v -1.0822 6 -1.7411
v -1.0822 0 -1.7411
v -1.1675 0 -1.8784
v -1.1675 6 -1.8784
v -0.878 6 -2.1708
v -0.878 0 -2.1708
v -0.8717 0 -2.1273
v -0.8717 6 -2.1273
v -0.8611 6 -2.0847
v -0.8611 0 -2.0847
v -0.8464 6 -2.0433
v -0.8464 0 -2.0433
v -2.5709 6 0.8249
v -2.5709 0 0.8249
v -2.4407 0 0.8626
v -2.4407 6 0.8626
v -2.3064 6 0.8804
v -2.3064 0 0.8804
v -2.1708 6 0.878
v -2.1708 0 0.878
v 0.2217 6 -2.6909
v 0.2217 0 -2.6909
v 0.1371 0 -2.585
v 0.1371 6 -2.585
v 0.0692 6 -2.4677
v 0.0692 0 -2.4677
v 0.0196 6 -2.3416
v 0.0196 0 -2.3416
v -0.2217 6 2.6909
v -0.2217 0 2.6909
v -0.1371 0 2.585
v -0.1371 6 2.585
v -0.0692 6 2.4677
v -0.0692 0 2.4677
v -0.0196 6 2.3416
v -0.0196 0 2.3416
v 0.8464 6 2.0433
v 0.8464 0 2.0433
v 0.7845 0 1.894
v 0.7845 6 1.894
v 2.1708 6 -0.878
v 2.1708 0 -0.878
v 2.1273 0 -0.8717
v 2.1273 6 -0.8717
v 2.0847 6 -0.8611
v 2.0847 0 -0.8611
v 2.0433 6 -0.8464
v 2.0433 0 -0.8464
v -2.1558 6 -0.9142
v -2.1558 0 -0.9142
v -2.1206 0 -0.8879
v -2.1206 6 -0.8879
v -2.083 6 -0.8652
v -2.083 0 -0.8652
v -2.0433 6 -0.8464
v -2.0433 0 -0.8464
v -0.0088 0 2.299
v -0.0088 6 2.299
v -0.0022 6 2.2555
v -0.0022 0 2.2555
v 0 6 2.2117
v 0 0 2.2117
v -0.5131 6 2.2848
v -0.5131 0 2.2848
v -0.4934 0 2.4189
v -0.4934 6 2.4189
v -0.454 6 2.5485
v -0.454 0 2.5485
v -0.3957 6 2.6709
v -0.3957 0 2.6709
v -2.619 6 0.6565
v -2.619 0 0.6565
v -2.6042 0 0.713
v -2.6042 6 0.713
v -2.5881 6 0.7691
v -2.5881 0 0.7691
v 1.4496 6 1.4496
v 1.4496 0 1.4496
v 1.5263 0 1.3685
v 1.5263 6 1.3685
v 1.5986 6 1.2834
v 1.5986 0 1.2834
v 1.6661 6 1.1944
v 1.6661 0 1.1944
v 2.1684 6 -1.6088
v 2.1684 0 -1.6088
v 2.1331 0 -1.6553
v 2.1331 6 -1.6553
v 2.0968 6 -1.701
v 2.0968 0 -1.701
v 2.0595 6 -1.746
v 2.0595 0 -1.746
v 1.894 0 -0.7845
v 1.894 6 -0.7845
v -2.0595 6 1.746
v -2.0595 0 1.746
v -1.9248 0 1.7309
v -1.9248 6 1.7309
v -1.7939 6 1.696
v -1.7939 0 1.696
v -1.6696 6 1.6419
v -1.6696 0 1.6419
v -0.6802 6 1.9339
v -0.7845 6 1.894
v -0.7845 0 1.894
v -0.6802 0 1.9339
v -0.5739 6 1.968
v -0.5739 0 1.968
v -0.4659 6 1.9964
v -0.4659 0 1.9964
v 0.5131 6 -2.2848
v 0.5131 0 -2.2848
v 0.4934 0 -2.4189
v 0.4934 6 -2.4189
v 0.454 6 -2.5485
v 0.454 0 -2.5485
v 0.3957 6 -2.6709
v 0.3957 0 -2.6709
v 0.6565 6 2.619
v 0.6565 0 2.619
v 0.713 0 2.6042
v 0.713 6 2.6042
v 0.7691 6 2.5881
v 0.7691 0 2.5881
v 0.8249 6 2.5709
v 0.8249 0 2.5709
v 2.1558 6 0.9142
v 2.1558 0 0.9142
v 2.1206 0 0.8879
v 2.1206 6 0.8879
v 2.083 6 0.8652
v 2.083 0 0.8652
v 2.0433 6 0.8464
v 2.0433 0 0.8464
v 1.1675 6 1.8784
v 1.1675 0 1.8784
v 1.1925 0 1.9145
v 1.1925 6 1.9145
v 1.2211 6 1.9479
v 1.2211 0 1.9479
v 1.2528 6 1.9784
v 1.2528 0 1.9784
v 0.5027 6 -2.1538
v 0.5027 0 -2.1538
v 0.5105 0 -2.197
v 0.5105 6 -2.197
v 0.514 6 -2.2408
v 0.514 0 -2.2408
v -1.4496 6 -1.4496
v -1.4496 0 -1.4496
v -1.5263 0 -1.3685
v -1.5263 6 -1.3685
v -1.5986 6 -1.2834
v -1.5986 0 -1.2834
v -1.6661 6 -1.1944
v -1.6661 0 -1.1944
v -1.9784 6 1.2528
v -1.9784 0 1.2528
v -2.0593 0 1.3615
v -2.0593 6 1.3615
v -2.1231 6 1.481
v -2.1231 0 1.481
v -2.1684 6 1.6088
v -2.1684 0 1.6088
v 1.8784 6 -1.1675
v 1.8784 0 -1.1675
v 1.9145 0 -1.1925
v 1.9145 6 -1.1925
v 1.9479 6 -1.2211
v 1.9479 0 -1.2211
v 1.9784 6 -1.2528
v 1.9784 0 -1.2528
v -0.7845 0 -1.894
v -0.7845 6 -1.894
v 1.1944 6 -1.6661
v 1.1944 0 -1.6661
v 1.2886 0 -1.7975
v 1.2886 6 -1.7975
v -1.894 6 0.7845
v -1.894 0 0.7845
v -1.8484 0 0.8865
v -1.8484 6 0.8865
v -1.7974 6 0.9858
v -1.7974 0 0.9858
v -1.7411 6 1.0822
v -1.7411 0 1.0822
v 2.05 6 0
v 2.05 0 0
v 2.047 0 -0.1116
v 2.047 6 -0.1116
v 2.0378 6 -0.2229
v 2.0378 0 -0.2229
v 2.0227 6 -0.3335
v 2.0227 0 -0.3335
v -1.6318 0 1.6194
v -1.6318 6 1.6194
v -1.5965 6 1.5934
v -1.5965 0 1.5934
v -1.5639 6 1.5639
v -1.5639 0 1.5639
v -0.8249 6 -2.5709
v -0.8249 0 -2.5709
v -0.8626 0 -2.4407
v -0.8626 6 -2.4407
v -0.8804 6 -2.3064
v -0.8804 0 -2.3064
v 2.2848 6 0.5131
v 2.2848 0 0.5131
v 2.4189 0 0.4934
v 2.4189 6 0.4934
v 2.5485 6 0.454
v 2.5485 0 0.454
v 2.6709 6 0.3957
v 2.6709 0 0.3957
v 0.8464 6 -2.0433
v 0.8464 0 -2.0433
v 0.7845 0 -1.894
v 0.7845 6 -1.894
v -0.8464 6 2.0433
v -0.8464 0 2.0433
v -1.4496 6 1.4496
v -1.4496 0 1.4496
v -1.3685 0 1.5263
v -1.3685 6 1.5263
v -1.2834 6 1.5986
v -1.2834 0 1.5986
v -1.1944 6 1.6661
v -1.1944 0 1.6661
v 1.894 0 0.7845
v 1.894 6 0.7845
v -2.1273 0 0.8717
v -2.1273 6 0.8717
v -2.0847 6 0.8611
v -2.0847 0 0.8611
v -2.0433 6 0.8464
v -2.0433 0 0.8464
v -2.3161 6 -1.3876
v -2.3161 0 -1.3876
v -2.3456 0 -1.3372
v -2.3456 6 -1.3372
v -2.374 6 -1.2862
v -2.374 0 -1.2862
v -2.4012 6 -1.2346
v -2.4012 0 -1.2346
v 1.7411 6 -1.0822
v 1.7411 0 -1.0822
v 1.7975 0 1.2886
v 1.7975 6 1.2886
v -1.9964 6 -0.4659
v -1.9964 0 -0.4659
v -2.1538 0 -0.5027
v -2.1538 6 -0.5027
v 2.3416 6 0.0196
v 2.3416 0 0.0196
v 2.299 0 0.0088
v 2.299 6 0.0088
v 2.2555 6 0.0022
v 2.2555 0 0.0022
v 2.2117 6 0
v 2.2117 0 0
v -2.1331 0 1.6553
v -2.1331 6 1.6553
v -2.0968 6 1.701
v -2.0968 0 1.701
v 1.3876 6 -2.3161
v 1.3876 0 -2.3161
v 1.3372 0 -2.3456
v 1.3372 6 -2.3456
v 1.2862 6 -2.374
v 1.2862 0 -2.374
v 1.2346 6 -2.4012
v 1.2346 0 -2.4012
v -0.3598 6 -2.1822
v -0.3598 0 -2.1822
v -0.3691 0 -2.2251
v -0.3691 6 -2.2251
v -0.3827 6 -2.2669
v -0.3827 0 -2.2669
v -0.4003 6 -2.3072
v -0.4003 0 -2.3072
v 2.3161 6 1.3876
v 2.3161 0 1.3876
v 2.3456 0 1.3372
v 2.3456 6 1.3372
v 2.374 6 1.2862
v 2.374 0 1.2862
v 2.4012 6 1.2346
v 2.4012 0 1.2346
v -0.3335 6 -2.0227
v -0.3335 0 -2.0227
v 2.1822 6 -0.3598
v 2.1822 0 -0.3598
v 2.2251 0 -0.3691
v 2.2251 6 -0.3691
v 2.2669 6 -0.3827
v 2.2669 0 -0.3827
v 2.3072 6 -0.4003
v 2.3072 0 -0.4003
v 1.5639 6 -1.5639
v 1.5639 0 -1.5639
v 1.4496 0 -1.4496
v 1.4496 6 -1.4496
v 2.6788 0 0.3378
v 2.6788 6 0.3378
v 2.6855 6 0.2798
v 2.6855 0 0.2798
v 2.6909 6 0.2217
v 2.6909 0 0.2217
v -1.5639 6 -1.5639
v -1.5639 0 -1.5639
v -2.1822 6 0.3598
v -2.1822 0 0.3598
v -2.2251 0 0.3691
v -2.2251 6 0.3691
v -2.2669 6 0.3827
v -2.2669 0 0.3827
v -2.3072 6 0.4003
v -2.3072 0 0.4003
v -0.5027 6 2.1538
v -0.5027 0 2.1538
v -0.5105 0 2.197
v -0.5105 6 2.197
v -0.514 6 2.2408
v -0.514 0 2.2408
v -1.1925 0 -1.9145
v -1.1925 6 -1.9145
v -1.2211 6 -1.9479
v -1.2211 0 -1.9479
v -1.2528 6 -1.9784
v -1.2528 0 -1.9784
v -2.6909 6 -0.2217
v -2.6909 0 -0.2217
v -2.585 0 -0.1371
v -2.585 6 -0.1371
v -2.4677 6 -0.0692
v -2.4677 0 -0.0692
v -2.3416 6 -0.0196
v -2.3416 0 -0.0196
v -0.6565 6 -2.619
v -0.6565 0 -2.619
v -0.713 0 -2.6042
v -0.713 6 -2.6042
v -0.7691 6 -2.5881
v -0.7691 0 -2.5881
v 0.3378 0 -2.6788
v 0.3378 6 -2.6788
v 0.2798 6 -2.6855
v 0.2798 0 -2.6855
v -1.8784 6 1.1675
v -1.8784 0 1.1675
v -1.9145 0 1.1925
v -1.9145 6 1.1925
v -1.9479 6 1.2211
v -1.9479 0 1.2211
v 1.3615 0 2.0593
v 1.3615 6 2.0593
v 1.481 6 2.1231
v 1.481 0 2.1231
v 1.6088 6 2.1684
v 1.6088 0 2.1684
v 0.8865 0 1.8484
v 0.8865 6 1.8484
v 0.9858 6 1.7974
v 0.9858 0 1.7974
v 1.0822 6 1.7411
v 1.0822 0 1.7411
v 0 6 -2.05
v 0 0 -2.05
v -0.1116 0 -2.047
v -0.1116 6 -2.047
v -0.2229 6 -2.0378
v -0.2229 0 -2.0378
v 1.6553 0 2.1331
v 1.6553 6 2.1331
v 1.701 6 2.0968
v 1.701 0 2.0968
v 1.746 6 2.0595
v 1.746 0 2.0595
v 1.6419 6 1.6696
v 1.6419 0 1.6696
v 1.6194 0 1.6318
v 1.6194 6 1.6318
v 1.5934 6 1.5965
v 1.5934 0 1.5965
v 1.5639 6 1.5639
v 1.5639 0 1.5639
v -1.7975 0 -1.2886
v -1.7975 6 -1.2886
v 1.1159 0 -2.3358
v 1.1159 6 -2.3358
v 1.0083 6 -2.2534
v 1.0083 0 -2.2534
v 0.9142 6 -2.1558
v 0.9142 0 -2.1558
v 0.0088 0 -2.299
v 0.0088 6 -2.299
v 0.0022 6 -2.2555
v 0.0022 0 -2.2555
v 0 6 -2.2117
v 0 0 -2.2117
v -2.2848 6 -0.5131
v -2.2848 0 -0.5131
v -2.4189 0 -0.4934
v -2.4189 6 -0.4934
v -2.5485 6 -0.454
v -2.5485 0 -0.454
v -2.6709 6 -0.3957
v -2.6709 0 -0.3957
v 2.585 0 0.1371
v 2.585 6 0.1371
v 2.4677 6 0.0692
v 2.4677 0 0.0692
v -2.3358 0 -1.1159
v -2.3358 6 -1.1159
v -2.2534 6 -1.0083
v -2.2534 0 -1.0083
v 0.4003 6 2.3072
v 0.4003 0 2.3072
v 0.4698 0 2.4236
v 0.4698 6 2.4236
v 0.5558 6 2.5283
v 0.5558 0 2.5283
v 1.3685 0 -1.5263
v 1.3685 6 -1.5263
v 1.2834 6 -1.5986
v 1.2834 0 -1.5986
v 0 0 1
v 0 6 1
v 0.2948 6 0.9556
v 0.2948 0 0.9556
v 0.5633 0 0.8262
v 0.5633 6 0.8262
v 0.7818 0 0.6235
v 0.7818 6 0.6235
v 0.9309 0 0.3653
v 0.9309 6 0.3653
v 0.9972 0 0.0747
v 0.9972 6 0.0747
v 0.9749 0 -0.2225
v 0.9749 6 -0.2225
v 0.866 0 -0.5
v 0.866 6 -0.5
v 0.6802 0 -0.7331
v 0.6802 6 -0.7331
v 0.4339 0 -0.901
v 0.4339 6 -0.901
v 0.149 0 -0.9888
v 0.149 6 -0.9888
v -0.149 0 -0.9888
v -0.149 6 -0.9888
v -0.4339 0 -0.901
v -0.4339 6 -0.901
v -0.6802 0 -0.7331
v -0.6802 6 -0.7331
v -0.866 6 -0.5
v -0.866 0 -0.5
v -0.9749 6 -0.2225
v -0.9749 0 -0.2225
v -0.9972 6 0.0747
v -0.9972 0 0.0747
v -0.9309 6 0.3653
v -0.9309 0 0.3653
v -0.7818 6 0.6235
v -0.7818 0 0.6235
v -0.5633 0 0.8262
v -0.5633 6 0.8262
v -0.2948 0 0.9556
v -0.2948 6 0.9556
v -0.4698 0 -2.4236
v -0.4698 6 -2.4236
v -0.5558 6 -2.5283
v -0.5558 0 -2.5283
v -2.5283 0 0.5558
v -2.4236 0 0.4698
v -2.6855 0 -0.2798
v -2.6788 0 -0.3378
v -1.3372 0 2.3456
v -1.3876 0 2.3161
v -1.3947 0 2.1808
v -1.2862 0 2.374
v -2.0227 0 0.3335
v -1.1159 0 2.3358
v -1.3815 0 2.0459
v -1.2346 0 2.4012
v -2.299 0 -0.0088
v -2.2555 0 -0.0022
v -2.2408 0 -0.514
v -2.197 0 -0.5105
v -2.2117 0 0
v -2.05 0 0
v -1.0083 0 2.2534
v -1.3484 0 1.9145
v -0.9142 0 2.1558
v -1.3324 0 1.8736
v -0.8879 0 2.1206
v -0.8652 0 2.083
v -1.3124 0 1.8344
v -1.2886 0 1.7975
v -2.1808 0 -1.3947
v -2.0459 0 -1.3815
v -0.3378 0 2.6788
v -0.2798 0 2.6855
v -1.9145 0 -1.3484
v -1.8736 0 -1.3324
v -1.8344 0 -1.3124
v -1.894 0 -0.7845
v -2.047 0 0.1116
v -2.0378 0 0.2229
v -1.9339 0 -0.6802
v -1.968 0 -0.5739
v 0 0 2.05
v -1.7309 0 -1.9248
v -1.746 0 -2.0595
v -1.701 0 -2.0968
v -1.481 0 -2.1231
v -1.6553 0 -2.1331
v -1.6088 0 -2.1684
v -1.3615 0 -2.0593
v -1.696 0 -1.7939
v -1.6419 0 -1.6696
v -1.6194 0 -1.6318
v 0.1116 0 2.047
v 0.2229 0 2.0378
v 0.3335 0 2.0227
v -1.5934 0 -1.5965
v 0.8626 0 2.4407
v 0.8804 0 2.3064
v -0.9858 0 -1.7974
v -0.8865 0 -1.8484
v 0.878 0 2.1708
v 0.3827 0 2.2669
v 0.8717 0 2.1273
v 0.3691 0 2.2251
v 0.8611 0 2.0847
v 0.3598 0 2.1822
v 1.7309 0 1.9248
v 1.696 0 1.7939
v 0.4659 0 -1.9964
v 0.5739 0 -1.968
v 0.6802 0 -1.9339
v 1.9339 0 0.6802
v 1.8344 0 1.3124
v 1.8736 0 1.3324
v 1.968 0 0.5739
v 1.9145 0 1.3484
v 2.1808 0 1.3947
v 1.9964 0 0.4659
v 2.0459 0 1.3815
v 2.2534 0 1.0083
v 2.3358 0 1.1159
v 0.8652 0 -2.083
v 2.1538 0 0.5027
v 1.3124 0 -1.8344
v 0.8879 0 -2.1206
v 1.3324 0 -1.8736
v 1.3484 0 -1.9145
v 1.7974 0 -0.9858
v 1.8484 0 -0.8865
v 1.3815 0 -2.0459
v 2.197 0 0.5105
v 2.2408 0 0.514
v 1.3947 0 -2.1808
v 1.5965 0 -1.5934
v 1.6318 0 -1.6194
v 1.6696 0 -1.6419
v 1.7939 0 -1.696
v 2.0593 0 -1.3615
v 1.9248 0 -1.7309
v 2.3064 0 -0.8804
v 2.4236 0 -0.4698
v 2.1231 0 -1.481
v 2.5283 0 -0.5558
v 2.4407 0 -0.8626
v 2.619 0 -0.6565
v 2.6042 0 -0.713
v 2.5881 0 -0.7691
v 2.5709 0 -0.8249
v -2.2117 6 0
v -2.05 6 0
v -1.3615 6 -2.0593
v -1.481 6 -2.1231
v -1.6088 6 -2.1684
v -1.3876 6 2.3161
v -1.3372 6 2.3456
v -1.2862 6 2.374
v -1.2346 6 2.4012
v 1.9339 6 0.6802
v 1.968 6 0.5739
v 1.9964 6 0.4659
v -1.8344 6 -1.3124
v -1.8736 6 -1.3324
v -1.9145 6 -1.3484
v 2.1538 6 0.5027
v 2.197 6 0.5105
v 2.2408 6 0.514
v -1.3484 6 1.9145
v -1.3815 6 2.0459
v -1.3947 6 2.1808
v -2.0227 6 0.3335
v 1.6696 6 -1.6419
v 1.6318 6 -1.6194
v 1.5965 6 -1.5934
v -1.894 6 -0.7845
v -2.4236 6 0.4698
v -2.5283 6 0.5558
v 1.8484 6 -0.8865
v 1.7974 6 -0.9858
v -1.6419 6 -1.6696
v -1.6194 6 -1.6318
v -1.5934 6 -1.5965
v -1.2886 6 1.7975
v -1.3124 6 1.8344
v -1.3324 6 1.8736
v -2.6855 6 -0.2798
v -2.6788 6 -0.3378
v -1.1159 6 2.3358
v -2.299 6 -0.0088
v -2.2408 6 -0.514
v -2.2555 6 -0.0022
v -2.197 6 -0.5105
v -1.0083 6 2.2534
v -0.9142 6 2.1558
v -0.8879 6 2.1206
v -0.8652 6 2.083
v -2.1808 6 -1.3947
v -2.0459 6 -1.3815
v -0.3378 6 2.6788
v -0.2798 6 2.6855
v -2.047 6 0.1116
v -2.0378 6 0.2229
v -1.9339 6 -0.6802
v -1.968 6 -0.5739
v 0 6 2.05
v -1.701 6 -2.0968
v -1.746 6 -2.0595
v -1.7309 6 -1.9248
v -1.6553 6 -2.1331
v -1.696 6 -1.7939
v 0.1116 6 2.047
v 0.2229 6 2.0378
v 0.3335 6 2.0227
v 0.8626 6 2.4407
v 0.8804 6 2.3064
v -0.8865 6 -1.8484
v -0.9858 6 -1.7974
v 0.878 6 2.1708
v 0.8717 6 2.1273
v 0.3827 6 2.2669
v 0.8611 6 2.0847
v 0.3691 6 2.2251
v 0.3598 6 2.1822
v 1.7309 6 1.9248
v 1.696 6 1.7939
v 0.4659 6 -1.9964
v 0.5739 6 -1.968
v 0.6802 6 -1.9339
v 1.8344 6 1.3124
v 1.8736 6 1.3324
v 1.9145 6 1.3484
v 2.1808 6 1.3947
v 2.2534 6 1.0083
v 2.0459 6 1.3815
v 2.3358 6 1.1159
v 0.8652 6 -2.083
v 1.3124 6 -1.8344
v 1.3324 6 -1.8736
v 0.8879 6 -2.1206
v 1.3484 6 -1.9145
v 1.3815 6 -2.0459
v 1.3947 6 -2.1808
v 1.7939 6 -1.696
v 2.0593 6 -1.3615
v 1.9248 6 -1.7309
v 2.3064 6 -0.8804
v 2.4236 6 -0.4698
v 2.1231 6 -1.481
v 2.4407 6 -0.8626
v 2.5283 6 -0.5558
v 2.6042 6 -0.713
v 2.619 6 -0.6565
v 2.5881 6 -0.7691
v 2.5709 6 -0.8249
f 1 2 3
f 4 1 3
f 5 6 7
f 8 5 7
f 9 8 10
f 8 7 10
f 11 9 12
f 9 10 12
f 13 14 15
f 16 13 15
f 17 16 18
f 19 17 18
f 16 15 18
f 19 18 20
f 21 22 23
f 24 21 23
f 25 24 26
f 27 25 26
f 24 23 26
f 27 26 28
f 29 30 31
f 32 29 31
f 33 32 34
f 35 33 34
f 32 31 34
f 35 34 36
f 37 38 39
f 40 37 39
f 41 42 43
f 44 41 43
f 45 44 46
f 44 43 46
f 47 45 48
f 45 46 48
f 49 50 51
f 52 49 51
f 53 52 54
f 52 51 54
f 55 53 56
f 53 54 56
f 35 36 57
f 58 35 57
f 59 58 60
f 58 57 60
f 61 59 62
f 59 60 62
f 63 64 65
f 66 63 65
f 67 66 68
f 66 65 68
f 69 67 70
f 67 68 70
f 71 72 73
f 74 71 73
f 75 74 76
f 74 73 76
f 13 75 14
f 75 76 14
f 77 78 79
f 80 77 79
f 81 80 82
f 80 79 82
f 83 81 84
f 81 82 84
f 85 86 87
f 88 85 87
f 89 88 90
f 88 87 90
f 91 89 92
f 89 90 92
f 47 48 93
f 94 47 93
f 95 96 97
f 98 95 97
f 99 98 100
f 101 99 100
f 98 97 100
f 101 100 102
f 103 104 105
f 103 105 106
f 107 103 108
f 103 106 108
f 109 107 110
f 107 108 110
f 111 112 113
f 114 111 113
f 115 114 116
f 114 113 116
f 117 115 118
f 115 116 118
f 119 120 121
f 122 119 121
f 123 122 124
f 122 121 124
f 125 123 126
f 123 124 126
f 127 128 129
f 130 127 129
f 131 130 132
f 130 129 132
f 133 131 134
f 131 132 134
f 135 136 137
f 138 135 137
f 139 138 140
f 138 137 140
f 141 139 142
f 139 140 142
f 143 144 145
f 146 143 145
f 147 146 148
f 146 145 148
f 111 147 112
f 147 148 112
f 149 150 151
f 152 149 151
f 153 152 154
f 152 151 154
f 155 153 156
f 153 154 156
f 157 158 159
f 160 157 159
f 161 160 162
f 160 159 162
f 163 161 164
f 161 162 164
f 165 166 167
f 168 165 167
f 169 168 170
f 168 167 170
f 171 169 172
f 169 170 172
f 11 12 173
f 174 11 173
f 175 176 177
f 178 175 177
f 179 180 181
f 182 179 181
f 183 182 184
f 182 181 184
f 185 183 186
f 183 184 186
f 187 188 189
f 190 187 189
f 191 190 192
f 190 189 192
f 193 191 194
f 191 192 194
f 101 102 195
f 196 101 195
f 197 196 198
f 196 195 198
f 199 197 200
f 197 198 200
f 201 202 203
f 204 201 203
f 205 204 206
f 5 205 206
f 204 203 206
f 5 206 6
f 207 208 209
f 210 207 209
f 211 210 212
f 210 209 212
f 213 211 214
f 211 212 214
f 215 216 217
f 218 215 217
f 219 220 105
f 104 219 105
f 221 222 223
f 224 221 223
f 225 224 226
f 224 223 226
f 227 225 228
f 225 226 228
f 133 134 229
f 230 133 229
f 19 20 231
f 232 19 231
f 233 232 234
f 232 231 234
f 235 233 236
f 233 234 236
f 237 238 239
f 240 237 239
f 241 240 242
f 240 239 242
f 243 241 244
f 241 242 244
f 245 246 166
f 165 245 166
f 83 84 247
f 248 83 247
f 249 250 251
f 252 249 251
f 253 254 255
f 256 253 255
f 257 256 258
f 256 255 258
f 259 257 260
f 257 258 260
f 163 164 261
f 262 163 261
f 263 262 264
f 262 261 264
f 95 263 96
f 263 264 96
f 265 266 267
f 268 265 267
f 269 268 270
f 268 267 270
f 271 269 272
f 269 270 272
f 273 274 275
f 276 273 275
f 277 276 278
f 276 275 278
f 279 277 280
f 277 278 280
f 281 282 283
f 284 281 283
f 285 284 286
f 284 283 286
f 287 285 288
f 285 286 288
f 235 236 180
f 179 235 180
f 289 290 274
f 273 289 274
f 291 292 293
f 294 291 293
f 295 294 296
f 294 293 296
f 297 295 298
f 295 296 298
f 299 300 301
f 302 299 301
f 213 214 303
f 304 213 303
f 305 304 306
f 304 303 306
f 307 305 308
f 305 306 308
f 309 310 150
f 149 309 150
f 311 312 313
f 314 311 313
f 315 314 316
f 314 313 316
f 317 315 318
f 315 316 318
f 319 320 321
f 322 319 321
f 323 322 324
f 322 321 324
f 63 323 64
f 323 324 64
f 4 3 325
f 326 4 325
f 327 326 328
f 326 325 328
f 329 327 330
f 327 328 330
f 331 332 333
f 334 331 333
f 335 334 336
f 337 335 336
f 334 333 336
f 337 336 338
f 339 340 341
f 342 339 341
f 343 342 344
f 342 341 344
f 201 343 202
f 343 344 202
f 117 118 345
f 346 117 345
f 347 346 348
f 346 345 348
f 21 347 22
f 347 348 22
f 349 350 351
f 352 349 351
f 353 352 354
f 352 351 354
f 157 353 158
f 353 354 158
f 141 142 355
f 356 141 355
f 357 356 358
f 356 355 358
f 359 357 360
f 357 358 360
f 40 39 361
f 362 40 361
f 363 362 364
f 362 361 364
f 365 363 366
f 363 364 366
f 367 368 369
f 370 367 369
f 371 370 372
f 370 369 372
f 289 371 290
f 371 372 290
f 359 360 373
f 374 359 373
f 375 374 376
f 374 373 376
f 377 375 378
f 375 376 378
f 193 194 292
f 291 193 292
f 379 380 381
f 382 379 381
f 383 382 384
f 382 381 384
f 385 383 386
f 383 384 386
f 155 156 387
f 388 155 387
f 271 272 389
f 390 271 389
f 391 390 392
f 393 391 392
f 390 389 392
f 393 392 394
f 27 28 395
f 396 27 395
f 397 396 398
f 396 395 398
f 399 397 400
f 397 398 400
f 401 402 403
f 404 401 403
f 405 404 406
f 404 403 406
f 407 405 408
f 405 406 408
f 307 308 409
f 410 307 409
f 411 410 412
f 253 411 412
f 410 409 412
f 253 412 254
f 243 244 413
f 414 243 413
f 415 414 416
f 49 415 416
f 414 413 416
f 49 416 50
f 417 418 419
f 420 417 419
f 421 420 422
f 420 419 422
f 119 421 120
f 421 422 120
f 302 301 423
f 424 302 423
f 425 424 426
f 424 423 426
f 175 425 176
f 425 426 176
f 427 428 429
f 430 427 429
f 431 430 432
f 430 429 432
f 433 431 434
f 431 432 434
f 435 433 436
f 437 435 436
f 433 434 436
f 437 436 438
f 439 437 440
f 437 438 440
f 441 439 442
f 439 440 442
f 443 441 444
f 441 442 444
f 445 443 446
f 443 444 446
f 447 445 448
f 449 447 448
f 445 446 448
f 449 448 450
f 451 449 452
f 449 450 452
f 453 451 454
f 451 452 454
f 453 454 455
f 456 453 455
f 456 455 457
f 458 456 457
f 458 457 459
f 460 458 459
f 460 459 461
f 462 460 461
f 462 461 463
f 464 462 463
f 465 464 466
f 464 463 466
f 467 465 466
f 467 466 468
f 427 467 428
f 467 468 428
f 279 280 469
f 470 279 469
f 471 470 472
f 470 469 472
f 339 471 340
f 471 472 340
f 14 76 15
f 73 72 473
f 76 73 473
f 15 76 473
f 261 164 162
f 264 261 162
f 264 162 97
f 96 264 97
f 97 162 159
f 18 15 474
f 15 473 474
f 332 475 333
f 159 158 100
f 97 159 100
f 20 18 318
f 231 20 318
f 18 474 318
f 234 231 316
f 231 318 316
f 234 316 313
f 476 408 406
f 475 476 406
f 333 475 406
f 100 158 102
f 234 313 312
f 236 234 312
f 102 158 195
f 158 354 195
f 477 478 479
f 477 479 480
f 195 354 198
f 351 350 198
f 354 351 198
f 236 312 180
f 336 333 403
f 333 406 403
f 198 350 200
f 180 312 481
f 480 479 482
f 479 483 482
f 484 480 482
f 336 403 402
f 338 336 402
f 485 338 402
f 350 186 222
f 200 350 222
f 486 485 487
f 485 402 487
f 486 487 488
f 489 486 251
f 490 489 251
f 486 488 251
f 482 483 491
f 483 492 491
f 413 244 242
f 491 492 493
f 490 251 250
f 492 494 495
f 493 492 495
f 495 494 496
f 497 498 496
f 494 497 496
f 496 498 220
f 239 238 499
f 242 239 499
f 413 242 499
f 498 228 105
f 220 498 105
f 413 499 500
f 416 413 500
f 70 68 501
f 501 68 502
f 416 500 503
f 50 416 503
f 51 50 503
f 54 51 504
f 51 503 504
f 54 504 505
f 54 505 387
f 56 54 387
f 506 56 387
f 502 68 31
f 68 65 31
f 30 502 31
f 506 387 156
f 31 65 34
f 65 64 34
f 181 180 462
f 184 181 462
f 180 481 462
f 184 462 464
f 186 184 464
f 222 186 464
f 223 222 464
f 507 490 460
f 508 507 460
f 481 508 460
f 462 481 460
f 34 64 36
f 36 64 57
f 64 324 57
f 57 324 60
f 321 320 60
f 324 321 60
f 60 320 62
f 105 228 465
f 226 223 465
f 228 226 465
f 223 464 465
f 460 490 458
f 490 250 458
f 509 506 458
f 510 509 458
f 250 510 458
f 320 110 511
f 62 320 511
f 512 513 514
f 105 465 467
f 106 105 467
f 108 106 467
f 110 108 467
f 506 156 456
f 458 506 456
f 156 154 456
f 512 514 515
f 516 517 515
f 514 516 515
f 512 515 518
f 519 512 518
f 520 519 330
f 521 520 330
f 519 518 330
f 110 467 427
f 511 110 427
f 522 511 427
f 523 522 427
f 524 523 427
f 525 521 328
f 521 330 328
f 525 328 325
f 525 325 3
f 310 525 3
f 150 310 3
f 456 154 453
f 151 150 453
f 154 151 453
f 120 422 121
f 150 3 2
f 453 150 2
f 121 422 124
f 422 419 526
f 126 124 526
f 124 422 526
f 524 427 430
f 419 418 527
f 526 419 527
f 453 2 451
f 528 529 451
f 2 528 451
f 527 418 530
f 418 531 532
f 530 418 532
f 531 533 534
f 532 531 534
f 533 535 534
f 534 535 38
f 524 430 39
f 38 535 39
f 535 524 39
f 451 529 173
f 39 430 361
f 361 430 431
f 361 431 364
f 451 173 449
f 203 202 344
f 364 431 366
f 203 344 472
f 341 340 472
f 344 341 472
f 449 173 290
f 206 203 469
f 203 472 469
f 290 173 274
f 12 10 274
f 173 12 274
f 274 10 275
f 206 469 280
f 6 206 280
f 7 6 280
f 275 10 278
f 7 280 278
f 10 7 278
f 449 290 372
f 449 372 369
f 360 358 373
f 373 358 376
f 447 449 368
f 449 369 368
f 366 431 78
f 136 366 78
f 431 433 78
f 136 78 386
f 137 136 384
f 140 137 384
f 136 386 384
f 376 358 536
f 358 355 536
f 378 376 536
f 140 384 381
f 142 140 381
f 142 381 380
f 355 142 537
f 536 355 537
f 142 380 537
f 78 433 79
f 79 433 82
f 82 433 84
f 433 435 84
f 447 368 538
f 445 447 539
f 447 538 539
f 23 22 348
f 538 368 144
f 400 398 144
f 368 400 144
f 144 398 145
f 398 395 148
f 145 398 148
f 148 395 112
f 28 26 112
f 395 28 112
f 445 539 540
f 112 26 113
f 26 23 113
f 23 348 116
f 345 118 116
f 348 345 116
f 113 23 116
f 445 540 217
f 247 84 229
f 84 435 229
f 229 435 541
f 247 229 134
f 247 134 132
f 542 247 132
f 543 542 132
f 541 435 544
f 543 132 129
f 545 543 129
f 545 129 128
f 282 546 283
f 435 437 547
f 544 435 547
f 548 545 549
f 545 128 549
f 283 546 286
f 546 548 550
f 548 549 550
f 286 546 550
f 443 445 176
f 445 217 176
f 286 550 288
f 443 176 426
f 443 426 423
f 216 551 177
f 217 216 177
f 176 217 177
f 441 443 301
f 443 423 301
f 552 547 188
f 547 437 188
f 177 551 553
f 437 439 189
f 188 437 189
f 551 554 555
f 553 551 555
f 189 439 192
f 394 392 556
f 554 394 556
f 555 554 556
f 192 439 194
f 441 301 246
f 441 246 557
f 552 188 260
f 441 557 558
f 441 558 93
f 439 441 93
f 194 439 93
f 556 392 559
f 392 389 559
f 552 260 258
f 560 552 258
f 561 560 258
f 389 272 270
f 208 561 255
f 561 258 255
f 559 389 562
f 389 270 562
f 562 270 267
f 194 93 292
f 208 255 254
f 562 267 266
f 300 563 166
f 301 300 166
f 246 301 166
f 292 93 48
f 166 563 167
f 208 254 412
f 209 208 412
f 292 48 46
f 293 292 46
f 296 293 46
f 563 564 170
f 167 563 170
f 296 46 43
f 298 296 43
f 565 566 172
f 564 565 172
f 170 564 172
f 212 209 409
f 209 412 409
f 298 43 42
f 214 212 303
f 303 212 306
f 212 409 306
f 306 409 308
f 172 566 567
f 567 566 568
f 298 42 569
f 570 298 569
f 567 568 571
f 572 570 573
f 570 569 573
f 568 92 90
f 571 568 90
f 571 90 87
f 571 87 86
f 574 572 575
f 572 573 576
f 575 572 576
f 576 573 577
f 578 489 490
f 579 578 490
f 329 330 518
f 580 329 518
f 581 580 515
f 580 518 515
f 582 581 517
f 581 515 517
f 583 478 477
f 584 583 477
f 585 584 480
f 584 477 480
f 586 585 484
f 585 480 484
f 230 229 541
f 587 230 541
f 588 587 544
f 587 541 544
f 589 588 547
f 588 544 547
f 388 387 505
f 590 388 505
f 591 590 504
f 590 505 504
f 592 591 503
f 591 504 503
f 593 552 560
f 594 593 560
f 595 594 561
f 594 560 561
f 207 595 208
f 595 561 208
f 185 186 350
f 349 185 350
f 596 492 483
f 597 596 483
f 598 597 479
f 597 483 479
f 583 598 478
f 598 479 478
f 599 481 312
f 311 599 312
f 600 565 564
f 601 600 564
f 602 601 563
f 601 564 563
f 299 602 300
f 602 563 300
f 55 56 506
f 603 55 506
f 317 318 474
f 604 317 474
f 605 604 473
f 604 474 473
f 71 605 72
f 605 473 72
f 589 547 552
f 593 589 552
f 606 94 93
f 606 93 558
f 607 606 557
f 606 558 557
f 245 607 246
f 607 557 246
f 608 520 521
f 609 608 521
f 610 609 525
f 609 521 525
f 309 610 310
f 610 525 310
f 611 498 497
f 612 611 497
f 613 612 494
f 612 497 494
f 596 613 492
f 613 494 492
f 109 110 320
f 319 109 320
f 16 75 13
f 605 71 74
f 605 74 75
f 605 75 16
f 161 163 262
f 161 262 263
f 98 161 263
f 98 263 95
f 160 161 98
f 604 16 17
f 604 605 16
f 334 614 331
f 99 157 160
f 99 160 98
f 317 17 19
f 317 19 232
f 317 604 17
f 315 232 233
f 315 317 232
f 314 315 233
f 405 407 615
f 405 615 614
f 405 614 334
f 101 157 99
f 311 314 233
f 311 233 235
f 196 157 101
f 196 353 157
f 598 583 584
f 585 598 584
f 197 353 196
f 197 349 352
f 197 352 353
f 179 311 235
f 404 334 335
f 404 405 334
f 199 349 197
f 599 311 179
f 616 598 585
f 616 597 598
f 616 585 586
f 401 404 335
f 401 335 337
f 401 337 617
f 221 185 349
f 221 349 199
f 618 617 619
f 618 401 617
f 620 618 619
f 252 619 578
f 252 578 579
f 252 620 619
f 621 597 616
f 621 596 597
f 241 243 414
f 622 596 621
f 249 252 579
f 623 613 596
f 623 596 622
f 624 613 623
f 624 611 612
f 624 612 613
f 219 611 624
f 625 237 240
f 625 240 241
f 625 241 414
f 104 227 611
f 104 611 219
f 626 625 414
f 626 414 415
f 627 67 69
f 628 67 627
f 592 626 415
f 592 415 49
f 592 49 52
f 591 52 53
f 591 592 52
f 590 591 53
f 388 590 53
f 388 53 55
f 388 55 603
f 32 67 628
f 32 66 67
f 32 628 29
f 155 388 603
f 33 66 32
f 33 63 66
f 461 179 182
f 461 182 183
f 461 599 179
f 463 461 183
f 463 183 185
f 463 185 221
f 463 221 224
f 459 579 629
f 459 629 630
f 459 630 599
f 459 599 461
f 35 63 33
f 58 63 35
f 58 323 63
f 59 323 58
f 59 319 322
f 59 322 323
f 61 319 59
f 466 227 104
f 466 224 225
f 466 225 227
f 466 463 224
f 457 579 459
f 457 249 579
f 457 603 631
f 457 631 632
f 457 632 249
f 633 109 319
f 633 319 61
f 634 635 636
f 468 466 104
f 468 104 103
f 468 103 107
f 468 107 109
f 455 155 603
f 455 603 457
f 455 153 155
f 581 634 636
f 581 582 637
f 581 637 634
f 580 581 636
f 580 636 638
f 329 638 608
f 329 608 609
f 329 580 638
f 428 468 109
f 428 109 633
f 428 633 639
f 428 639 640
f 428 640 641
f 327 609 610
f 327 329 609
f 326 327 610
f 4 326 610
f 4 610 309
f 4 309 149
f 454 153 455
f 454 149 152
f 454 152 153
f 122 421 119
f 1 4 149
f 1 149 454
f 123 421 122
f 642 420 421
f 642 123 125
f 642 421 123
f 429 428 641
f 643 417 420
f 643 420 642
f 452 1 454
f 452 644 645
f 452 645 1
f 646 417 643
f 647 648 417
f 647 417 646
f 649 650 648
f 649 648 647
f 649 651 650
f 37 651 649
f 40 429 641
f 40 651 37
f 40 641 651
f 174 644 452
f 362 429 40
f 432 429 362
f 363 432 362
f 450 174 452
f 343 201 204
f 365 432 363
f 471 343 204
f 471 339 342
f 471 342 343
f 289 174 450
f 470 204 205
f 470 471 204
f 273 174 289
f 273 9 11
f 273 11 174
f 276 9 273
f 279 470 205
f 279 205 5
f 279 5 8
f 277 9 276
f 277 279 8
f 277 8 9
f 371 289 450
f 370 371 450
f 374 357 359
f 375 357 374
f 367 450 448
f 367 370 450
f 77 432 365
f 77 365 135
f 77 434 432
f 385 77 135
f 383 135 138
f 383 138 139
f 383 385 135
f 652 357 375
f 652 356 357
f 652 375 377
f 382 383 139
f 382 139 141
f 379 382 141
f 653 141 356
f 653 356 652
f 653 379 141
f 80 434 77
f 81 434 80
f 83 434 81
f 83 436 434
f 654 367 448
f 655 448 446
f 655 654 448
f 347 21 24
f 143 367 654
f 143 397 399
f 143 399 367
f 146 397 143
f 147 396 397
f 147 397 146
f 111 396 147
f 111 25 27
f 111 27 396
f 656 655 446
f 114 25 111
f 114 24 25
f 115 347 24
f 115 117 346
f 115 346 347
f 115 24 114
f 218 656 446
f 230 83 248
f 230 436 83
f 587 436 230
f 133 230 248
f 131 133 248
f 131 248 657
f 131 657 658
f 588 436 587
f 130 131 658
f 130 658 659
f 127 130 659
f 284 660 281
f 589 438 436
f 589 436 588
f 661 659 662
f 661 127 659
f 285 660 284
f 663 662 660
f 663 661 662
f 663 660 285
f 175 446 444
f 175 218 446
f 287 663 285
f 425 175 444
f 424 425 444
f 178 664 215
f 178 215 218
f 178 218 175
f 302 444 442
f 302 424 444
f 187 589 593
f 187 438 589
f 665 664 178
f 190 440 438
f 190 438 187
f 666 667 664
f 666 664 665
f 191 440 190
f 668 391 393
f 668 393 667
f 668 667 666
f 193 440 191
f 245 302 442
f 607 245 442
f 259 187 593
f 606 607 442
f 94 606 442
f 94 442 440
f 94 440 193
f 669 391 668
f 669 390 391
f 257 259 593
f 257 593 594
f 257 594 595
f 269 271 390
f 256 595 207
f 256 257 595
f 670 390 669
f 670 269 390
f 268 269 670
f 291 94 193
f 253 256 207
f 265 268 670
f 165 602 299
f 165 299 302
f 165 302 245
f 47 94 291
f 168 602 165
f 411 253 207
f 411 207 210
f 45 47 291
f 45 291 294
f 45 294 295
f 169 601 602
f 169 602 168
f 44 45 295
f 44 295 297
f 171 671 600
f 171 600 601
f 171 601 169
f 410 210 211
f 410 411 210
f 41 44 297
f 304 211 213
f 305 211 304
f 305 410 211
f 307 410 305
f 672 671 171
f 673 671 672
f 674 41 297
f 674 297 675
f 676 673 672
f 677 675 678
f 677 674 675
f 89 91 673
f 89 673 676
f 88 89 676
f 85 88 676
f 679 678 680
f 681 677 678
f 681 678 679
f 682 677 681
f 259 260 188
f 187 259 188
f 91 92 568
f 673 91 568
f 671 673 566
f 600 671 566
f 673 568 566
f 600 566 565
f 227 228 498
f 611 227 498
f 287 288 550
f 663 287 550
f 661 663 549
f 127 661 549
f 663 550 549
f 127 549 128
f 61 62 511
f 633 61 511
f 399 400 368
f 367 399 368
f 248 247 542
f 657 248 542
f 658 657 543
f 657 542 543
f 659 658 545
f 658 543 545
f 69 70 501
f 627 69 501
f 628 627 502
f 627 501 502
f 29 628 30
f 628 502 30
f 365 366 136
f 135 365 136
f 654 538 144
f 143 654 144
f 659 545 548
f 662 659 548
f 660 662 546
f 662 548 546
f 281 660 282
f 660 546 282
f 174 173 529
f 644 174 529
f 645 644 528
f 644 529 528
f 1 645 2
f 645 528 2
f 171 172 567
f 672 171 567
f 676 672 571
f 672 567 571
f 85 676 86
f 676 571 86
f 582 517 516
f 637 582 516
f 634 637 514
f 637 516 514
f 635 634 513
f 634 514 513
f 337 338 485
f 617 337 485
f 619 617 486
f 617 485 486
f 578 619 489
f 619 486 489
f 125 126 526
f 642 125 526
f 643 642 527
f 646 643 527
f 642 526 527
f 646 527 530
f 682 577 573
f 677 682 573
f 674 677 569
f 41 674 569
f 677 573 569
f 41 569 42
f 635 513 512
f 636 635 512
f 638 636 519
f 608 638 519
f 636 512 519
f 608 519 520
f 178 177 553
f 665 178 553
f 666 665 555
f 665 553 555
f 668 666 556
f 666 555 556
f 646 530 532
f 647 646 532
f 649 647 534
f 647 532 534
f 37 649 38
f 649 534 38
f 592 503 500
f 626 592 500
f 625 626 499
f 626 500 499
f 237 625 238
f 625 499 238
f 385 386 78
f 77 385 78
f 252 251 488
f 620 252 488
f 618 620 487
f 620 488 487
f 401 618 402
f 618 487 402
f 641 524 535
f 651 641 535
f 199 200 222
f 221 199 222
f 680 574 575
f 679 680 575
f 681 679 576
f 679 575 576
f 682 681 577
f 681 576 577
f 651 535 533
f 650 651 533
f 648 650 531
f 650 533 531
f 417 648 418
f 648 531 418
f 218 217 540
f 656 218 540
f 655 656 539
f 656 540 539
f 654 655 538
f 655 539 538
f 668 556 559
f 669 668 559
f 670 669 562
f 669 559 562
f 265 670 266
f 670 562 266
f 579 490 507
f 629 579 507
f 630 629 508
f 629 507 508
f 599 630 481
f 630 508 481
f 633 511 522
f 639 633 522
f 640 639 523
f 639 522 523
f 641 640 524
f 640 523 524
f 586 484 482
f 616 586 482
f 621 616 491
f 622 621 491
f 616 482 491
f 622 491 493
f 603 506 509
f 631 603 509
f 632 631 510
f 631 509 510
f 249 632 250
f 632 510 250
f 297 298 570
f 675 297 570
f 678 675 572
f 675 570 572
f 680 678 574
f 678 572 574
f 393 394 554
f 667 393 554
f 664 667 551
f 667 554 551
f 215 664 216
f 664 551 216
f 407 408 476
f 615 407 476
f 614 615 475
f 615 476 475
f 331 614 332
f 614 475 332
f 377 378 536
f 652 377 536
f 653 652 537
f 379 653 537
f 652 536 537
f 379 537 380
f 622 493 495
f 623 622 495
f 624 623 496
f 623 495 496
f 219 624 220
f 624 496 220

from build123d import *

# Parameters (mm, degrees)
RESSALTO_EXTRUS_O2_DEPTH = 6
PADR_OCIRCULAR1_COUNT    = 16
ESBO_O6_R                = 1
CORTE_EXTRUS_O2_DEPTH    = 6


with BuildPart() as part:
    # Esboço5 → Ressalto-extrusão2 (new body)
    with BuildSketch(Plane(origin=(0, 0, 0), x_dir=(1, 0, 0), z_dir=(0, 1, 0))):
        with BuildLine():
            ThreePointArc((0.513081642, 2.284755025), (0.476160184, 2.484429594), (0.395663043, 2.670852066))
            ThreePointArc((0.395663043, 2.670852066), (0.308851182, 2.682277194), (0.221714504, 2.690881394))
            ThreePointArc((0.221714504, 2.690881394), (0.10095443, 2.527632713), (0.019617773, 2.341574991))
            ThreePointArc((0.019617773, 2.341574991), (0.004932086, 2.277352206), (0, 2.211656619))
            Line((0, 2.211656619), (0, 2.05))
            ThreePointArc((0, 2.05), (-0.23449812, -2.036543796), (0.465917747, 1.996351836))
            Line((0.465917747, 1.996351836), (0.50265857, 2.153777928))
            ThreePointArc((0.50265857, 2.153777928), (0.512786649, 2.218875221), (0.513081642, 2.284755025))
        make_face()
    ressalto_extrus_o2 = extrude(amount=RESSALTO_EXTRUS_O2_DEPTH)

    # PadrãoCircular1: Ressalto-extrusão2 ×16 about axis
    padr_ocircular1_axis = Axis((0, 0, 0), (0, 1, 0))
    for i in range(1, PADR_OCIRCULAR1_COUNT):
        add(ressalto_extrus_o2.rotate(padr_ocircular1_axis, i * 360 / PADR_OCIRCULAR1_COUNT))

    # Esboço6 → Corte-extrusão2 (cut)
    with BuildSketch(Plane(origin=(0, 6, 0), x_dir=(1, 0, 0), z_dir=(0, 1, 0))):
        with Locations(Location((0, 0, 0), (0, 0, 270))):
            Circle(ESBO_O6_R)
    extrude(amount=-CORTE_EXTRUS_O2_DEPTH, mode=Mode.SUBTRACT)


solid = part.part
